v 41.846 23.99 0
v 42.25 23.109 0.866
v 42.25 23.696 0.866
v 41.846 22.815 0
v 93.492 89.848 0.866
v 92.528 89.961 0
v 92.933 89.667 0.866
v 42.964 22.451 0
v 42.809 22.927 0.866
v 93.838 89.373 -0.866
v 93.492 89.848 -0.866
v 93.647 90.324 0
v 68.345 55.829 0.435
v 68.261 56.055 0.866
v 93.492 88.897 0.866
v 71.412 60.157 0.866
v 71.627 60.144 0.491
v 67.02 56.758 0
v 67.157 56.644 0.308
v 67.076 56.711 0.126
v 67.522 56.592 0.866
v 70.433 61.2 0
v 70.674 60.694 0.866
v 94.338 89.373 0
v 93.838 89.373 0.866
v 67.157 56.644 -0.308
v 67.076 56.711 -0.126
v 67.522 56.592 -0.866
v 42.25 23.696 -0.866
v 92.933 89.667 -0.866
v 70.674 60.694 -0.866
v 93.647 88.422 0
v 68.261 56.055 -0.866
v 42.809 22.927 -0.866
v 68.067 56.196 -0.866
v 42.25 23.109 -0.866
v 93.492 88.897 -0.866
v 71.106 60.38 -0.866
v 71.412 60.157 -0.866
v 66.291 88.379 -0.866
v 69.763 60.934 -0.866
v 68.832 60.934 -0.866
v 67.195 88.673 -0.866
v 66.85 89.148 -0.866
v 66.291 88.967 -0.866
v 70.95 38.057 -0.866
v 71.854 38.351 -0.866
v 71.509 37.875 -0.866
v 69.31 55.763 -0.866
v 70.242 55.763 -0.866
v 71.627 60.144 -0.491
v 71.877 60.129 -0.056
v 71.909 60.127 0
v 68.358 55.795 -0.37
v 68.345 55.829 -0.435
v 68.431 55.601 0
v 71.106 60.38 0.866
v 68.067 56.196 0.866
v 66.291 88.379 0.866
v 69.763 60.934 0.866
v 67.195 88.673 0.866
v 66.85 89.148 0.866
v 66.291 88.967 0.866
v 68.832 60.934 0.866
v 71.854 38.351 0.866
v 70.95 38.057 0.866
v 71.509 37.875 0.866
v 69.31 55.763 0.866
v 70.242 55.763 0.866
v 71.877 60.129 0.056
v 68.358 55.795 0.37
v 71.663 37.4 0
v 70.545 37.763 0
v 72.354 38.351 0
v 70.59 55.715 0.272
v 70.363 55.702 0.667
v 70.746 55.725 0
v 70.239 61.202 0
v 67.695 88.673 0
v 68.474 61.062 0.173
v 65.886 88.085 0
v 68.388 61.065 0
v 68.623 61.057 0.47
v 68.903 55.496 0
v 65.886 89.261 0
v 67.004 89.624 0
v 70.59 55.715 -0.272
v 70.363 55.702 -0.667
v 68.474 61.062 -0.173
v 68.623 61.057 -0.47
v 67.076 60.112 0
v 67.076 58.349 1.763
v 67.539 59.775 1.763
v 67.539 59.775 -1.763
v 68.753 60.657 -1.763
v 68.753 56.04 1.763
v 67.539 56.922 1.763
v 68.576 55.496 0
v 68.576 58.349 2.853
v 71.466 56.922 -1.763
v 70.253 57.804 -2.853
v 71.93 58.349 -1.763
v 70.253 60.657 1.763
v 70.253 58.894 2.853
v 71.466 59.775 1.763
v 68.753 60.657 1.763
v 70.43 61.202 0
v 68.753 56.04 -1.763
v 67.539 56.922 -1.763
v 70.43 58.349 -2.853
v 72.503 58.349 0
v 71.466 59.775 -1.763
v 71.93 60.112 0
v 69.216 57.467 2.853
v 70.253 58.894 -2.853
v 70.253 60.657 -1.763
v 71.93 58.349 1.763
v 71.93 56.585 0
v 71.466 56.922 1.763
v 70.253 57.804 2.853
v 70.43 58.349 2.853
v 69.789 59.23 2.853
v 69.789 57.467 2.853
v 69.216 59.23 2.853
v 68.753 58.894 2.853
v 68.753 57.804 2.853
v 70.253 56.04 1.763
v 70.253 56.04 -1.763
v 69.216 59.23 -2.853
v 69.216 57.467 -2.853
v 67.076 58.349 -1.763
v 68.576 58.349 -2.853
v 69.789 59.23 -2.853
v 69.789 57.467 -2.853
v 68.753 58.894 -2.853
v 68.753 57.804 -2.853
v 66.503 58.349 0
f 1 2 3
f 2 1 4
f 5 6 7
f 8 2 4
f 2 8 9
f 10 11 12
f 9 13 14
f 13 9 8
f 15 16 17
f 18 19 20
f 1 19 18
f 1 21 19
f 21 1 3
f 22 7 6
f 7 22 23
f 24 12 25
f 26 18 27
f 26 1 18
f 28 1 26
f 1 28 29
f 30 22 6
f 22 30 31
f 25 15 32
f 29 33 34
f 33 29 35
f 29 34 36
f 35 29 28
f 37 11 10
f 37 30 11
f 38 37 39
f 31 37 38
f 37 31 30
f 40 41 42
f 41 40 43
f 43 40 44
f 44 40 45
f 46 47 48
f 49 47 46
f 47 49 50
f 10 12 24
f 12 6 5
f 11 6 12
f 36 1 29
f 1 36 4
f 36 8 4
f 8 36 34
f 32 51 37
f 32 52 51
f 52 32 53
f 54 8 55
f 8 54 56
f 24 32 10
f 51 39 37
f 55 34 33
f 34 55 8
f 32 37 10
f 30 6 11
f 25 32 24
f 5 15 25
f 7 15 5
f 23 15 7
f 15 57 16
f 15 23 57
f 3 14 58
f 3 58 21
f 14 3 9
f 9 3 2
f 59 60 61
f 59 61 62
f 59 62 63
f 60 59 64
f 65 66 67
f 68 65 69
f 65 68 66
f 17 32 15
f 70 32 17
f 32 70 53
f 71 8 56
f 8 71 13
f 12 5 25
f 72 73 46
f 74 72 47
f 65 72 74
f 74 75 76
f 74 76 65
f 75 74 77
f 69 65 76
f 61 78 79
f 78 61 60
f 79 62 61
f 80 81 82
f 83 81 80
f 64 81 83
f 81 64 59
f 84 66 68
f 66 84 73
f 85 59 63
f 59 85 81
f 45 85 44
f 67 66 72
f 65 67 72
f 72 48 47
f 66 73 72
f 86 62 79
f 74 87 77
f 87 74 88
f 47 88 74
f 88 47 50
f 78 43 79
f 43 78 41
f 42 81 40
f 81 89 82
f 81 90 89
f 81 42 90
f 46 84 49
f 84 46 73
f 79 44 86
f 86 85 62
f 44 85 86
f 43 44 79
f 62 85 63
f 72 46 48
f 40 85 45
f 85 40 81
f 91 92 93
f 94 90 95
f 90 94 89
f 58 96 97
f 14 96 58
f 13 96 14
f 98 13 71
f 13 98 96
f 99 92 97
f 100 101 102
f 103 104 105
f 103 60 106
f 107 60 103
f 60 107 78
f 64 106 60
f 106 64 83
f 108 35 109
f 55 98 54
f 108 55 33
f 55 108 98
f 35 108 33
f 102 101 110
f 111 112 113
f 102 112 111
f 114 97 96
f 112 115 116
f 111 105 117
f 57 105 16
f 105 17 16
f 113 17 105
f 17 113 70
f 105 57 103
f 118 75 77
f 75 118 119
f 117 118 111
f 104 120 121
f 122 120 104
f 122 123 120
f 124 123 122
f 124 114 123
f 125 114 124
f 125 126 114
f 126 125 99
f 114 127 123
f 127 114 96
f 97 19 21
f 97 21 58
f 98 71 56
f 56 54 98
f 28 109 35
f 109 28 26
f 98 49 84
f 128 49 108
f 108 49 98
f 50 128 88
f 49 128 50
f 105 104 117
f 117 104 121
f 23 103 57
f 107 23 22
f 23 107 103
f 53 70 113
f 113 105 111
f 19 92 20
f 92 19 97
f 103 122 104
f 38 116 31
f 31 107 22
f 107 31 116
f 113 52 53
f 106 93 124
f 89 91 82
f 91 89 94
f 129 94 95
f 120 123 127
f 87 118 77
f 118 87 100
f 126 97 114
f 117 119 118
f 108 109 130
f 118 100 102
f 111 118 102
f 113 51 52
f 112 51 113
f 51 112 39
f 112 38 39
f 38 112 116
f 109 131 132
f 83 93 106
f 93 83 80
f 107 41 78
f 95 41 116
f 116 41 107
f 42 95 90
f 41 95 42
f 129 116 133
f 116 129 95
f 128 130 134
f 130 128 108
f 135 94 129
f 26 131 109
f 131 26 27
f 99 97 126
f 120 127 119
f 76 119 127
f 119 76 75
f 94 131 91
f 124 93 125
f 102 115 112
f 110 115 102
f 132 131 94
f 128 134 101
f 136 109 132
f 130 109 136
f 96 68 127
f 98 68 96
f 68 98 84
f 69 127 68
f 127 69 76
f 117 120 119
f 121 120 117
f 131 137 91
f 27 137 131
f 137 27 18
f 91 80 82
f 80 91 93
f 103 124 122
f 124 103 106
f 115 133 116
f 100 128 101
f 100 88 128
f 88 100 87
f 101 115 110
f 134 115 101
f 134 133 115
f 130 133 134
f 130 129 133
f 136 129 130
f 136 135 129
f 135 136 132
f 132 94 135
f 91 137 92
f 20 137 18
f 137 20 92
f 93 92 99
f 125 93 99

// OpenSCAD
function xdot(a,b)= a.x*b.y-a.y*b.x;
function ndot(a,b)= a.x*b.x-a.y*b.y;
//function  IntersectionOfLines(pa1, pa2, pb1, pb2)=
//let(
//da = [(pa1.x-pa2.x),      (pa1.y-pa2.y)], 
//db = [(pb1.x-pb2.x),      (pb1.y-pb2.y)],
//the = da.x*db.y - da.y*db.x                 )
//(the == 0)? 
//undef: /* no in tersection*/
//let (
//A = (pa1.x * pa2.y - pa1.y * pa2.x),
//B = (pb1.x * pb2.y - pb1.y * pb2.x)         )
//[( A*db.x - da.x*B ) / the , ( A*db.y - da.y*B ) / the]
//;

function  IntersectionOfLines(pa1, pa2, pb1, pb2)=
let( da = pa1-pa2, db = pb1-pb2 ,the = xdot(da,db))
(the == 0)? undef: /* no in tersection*/
let (P=[xdot(pa1,pa2),xdot(pb1,pb2)])
[ndot(P,[db.x,da.x])   , ndot(P,[db.y,da.y]) ]/ the
;
// demo code
pa1=[rnd(100),rnd(100)];
pa2 =[rnd(100),rnd(100)];
pb1=[rnd(100),rnd(100)];
pb2=[rnd(100),rnd(100)];
I=IntersectionOfLines(pa1, pa2, pb1, pb2);
line(pa1, pa2);
line(pb1, pb2);


// show in red if intersecting 
// else extend linese outside segments
if(I.x>min(pa1.x,pa2.x)&&I.x<max(pa1.x,pa2.x)
&&I.y>min(pa1.y,pa2.y)&&I.y<max(pa1.y,pa2.y))
{color("red")translate(I) sphere(3);
}
else{
translate(I) sphere(3);
hull(){
translate(I) sphere(0.5);
translate(pa1) sphere(0.5);}
hull(){
translate(I) sphere(0.5);
translate(pb1) sphere(0.5);}
}


echo(I);

module line(p1,p2){hull(){
translate(p1) sphere(1);
translate(p2) sphere(1);
}}

function rnd(a = 1, b = 0, s = []) =
s == [] ?
  (rands(min(a, b), max(
    a, b), 1)[0]) :
  (rands(min(a, b), max(a, b), 1, s)[0]);
